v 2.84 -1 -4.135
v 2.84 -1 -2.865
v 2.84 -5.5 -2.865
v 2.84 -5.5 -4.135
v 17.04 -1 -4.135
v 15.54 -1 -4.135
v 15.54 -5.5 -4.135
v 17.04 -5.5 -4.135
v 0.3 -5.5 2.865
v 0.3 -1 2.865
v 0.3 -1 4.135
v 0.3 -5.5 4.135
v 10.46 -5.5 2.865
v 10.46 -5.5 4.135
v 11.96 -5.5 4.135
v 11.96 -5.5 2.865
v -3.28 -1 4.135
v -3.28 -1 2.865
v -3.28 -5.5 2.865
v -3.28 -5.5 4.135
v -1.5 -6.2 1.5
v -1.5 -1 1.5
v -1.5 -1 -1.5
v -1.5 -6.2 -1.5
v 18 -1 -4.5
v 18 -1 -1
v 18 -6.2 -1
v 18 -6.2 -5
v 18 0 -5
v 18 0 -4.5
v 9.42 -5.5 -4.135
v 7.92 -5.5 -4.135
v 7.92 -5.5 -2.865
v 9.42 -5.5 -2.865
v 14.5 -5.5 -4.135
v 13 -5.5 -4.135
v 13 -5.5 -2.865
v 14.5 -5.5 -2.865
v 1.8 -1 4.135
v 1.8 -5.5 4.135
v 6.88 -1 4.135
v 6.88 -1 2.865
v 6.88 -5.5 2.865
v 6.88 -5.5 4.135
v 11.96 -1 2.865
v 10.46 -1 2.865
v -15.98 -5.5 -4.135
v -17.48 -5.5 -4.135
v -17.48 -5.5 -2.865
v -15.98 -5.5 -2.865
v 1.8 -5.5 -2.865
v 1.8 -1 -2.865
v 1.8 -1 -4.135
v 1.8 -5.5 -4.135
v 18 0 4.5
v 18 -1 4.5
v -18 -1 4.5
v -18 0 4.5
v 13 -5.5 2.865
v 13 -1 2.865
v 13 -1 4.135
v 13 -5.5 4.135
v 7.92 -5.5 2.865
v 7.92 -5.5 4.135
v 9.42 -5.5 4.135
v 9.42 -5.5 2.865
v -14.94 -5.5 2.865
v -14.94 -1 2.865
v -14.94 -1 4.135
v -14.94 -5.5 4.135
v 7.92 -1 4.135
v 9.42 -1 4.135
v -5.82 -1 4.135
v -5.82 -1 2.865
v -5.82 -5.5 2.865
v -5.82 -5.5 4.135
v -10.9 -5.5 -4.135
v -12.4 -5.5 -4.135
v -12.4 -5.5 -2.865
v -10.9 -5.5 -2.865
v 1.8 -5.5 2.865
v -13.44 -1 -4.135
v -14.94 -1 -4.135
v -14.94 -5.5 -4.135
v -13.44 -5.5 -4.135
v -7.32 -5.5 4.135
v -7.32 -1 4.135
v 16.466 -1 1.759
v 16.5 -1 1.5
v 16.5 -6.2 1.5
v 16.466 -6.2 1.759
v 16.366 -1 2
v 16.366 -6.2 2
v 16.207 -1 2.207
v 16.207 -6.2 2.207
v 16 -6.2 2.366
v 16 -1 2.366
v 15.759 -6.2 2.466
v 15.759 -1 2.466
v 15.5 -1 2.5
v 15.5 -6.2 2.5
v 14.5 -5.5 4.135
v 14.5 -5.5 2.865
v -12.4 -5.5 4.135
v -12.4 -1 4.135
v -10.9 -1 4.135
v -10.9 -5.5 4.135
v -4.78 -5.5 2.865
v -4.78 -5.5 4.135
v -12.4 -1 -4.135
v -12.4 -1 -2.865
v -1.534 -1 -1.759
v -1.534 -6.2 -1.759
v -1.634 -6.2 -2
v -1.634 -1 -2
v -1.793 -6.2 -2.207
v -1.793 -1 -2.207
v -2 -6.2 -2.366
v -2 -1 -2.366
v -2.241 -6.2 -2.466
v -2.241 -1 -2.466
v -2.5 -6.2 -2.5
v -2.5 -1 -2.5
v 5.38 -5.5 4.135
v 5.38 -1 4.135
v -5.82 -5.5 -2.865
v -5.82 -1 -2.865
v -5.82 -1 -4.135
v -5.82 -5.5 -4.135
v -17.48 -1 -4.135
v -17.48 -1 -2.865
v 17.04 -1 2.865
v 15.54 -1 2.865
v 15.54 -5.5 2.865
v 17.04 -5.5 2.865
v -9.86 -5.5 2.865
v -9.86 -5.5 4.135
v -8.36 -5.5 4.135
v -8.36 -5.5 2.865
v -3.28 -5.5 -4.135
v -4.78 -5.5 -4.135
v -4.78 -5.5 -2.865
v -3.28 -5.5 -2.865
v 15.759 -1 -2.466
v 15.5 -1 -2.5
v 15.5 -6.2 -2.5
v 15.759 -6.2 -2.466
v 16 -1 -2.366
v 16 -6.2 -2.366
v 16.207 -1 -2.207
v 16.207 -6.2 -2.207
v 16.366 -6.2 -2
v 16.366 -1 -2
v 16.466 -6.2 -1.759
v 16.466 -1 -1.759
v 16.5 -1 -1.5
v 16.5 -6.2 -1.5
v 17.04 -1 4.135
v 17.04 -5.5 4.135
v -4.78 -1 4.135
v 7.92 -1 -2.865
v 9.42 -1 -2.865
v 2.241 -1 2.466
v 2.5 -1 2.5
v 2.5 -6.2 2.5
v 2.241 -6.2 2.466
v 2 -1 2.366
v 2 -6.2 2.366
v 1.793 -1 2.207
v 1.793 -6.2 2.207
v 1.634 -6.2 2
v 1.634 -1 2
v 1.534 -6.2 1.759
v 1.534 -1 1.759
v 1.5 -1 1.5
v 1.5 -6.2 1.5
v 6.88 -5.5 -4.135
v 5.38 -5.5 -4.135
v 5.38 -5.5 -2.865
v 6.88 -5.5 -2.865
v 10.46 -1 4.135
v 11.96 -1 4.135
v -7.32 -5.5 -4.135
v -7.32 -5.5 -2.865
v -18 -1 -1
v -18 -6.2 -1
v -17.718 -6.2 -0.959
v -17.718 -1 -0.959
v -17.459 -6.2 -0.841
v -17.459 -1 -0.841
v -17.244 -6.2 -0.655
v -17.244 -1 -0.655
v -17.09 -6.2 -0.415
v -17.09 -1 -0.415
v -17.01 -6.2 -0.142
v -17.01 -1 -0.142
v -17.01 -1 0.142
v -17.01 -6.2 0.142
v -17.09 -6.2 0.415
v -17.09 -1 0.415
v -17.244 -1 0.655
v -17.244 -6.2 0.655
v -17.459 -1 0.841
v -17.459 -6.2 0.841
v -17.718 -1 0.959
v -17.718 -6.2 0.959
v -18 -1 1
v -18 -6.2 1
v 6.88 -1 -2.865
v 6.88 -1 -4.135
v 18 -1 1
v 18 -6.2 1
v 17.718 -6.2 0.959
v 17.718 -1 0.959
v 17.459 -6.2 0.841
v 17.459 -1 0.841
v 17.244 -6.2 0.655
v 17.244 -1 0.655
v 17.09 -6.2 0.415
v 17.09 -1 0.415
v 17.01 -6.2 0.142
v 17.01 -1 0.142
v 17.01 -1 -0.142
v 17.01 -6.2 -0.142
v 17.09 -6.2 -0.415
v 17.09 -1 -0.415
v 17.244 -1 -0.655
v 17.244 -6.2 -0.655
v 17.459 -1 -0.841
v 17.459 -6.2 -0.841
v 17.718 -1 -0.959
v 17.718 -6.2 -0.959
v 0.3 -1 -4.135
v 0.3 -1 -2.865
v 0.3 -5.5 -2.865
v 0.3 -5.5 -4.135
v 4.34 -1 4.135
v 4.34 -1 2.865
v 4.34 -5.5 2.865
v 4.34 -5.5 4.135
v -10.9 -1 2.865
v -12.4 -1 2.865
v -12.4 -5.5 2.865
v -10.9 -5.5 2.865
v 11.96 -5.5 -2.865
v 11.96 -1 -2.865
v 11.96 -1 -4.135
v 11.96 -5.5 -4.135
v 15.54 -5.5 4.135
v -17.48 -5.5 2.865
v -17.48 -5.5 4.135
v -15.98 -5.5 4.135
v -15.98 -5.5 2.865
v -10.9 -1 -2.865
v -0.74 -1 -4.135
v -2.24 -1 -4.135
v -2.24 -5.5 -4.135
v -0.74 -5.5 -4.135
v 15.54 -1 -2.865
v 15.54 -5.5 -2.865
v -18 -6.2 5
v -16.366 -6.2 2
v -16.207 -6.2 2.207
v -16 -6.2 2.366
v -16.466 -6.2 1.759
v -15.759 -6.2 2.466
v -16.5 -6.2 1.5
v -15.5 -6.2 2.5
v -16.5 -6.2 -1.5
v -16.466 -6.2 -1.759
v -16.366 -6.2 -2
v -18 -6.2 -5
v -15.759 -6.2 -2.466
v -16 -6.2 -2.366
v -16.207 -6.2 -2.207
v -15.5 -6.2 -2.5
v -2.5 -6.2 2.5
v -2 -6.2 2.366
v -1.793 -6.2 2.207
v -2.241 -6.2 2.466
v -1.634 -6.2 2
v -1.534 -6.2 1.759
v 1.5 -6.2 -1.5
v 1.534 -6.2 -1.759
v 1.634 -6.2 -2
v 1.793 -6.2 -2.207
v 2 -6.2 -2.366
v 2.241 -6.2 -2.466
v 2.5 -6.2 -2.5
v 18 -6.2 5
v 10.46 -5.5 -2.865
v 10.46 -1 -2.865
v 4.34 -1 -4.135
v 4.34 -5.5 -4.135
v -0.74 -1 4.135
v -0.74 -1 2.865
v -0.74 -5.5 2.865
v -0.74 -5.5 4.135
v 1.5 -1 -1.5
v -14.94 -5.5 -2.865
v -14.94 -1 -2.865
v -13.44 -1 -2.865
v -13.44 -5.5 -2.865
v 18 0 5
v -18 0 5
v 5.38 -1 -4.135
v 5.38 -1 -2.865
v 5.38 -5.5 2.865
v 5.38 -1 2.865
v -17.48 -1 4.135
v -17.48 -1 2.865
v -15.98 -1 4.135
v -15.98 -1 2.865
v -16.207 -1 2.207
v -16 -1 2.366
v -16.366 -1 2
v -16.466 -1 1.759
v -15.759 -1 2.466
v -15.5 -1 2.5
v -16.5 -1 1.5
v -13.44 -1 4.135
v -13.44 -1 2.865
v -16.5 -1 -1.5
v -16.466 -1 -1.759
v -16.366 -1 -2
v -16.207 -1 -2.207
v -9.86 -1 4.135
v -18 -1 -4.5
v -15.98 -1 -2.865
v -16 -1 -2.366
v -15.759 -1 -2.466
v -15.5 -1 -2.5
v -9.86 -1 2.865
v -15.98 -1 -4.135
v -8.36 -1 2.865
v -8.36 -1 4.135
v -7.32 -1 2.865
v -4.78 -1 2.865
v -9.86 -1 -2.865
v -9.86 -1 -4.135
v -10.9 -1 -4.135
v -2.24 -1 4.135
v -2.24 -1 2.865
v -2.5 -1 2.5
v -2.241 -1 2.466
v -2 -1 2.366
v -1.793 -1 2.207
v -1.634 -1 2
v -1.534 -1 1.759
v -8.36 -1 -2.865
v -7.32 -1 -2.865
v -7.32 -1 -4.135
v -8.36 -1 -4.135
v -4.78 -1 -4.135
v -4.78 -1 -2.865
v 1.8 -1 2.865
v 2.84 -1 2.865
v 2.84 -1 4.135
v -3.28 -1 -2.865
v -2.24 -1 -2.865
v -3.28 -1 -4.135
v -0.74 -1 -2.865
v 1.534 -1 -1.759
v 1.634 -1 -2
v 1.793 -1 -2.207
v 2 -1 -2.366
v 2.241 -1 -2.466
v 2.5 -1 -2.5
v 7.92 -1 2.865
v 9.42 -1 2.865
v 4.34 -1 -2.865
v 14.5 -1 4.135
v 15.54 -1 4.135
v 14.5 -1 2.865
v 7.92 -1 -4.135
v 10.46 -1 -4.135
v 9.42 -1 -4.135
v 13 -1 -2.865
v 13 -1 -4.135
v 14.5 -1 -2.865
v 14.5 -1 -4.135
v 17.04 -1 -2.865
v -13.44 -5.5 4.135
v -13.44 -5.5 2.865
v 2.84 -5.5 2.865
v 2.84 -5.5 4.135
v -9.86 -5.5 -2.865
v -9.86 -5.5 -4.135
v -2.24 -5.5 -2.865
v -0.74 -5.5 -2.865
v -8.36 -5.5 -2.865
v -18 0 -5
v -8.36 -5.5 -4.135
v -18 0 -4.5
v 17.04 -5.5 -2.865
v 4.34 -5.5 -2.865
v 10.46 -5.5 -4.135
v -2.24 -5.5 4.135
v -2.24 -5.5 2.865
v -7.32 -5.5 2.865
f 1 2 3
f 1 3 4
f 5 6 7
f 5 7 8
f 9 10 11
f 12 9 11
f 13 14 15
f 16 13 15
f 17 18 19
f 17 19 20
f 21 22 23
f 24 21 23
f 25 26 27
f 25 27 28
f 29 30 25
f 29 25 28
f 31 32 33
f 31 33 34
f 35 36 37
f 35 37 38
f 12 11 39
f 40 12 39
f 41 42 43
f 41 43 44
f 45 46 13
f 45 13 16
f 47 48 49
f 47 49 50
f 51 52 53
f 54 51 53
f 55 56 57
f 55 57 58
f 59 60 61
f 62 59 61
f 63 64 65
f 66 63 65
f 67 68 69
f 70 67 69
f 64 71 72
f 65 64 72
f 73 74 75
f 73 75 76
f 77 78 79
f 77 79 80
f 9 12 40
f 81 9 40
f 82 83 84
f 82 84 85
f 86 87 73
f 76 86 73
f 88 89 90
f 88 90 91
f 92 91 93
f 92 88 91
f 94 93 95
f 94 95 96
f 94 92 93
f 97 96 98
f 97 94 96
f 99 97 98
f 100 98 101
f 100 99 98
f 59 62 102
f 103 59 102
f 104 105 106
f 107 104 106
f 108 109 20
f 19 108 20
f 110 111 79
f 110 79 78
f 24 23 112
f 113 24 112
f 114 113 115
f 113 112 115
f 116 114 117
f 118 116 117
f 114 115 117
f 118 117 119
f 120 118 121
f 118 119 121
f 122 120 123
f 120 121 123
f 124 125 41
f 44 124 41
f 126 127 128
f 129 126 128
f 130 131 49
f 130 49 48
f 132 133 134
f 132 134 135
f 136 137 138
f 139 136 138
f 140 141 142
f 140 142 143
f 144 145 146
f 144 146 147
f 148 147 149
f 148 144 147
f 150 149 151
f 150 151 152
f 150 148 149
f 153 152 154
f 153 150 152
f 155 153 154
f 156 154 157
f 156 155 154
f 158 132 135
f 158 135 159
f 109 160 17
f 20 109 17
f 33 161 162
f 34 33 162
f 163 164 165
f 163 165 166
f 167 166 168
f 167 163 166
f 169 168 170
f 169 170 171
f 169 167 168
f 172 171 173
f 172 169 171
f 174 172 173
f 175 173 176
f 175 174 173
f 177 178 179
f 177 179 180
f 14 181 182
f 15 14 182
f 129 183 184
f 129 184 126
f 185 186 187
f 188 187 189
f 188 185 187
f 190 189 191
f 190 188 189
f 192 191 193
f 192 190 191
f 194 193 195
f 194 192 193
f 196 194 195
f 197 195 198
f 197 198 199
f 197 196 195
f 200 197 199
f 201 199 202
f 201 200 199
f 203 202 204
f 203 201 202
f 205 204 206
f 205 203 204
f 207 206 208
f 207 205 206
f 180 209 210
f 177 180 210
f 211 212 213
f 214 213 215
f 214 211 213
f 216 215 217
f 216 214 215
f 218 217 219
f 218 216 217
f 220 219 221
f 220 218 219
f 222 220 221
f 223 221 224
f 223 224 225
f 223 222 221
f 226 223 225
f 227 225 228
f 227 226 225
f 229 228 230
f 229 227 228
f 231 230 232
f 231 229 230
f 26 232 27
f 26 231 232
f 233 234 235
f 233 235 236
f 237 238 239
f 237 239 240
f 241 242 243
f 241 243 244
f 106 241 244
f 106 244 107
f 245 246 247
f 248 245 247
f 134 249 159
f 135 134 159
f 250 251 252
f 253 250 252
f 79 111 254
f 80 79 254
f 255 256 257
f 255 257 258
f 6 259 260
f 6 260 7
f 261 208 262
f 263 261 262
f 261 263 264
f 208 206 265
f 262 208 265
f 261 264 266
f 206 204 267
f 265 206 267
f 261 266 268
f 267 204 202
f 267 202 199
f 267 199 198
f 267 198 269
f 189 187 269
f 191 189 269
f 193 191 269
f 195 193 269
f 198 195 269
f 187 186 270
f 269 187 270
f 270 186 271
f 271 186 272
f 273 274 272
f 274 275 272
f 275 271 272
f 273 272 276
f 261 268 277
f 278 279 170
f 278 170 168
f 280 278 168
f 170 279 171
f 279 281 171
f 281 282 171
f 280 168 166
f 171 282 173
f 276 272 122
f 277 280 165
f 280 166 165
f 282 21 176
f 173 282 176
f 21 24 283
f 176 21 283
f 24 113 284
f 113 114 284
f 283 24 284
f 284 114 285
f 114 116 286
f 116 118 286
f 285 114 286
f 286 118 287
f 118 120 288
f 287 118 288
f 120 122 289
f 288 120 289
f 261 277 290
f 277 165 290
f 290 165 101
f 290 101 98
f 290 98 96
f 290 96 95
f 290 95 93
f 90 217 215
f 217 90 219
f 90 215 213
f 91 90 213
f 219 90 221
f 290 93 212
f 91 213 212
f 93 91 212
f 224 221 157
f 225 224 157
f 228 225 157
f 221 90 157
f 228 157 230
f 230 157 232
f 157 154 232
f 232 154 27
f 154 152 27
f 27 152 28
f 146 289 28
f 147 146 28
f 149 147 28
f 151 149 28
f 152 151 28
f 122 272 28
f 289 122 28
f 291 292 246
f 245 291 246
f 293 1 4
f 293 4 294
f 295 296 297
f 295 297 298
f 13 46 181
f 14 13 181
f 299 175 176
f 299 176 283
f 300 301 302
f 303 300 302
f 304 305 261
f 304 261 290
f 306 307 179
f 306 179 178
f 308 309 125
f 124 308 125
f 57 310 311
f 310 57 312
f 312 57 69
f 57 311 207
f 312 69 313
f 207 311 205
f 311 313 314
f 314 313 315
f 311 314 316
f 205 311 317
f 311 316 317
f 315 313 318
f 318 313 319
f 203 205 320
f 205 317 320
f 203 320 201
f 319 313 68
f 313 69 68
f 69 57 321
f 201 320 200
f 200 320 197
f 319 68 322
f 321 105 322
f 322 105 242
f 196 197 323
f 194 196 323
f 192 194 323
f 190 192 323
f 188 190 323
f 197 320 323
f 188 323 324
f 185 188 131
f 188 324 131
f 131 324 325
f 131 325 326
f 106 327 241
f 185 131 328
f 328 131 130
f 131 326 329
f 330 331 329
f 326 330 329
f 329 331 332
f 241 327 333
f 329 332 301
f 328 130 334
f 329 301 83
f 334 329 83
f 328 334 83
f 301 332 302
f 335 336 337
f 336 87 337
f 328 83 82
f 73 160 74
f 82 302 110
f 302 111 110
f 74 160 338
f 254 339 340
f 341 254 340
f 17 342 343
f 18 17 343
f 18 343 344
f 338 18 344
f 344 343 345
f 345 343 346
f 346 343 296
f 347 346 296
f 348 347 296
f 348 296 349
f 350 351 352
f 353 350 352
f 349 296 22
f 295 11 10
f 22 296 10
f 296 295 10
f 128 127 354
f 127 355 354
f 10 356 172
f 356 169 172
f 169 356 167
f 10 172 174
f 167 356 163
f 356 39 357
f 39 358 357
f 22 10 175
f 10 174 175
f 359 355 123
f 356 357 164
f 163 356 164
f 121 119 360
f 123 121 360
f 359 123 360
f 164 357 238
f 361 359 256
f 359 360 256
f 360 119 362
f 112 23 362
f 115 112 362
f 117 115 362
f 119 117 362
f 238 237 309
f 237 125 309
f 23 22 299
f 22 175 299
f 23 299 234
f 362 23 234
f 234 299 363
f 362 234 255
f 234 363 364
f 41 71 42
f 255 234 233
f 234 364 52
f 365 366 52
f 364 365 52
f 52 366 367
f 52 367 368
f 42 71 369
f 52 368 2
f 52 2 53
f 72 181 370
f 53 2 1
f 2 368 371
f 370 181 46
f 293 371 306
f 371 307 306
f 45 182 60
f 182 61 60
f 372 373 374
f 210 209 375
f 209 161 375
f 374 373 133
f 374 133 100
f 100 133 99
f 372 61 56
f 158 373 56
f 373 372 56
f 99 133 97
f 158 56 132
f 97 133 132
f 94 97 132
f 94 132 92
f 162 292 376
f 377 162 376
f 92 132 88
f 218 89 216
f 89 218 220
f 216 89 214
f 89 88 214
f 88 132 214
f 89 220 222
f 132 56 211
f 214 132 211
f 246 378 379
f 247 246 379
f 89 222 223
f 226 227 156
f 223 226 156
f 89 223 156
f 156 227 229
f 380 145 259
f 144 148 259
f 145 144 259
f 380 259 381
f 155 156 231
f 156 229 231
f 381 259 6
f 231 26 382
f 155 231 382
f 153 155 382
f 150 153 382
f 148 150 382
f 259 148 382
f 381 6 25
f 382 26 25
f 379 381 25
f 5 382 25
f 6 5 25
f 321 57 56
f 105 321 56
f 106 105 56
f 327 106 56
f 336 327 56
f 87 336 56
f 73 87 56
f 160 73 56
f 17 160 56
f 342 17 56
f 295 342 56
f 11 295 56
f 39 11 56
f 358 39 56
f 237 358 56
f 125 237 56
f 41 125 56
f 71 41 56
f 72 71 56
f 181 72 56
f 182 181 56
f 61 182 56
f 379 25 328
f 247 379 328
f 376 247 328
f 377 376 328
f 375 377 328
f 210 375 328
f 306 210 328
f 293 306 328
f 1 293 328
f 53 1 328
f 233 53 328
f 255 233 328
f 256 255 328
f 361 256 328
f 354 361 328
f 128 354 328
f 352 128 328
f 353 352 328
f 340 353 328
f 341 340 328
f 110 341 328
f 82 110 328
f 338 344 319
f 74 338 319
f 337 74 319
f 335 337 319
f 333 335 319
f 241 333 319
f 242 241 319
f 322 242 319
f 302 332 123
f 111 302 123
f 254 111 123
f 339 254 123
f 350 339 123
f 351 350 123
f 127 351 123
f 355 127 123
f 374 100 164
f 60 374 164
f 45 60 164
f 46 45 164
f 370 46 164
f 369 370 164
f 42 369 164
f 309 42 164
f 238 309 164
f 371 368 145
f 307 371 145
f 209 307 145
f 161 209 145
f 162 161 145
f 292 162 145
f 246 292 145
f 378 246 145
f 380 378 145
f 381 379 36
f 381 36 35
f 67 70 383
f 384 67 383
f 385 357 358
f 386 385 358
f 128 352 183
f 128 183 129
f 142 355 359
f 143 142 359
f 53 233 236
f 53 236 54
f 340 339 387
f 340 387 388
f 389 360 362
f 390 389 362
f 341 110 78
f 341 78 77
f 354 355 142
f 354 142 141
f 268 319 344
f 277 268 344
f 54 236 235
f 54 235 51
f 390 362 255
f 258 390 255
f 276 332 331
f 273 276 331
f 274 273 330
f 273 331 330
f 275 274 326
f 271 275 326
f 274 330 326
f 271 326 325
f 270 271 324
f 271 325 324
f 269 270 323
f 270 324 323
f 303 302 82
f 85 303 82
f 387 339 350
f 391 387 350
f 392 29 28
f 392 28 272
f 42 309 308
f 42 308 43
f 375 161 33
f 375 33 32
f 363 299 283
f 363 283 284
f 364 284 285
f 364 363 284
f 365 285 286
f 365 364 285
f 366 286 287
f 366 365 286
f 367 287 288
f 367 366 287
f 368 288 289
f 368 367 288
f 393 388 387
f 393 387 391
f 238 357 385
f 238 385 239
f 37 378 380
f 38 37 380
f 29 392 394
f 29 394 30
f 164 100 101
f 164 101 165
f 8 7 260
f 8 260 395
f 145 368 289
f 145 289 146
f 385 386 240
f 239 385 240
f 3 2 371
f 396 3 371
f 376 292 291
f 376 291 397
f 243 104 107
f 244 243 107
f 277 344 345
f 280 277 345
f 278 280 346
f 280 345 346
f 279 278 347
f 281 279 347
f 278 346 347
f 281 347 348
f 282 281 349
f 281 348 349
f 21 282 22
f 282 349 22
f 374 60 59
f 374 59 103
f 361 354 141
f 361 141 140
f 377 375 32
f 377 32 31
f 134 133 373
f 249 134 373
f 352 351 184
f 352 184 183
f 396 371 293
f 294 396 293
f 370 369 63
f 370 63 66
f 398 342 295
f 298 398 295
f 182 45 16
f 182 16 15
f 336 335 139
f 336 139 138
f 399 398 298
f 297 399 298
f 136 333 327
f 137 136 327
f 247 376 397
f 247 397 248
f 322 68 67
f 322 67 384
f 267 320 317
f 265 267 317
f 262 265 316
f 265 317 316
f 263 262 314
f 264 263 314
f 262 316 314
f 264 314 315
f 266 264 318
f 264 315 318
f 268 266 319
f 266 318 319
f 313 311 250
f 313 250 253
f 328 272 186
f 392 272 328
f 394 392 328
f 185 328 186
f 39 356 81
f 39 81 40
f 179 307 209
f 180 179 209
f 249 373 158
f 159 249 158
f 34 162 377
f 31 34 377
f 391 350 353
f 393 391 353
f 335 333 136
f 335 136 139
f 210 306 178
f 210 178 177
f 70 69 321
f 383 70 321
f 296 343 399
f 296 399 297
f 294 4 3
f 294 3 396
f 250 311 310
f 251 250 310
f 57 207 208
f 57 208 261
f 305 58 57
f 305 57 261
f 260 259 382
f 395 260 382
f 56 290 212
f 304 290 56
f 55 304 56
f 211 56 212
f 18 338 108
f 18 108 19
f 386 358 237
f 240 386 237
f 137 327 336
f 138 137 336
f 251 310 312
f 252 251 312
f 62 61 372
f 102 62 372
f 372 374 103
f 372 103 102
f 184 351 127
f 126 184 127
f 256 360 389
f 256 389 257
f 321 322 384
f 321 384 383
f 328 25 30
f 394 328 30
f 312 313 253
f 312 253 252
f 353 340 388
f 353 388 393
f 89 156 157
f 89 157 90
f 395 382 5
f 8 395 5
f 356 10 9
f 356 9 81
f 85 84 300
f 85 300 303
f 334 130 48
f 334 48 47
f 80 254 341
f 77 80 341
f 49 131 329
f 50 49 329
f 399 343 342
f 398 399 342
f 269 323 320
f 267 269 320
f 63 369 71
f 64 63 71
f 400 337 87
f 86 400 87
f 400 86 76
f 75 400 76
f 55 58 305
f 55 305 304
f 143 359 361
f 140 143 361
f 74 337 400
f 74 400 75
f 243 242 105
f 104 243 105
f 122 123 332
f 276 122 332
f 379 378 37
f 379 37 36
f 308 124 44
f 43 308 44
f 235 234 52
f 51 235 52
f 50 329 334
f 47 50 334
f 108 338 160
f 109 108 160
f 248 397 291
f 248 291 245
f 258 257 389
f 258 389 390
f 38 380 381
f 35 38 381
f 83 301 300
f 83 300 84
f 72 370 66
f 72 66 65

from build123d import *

# Parameters (mm, degrees)
BOSS_EXTRU_1_DEPTH      = 6.2
ESQUISSE4_W             = 9
ESQUISSE4_H             = 1.618443578
ENL_V_MAT_EXTRU_1_DEPTH = 40.6
ESQUISSE5_W             = 1.5
ESQUISSE5_H             = 1.27
ENL_V_MAT_EXTRU_2_DEPTH = 4.5


with BuildPart() as part:
    # Esquisse2 → Boss.-Extru.1 (new body)
    with BuildSketch(Plane(origin=(0, 0, 0), x_dir=(1, 0, 0), z_dir=(0, 1, 0))):
        with BuildLine():
            Line((-18, -5), (18, -5))
            Line((18, -5), (18, -1))
            ThreePointArc((18, -1), (17, 0), (18, 1))
            Line((18, 1), (18, 5))
            Line((18, 5), (-18, 5))
            Line((-18, 5), (-18, 1))
            ThreePointArc((-18, 1), (-17, 0), (-18, -1))
            Line((-18, -1), (-18, -5))
        make_face()
        with BuildLine():
            Line((1.5, -1.5), (1.5, 1.5))
            ThreePointArc((1.5, 1.5), (1.792893219, 2.207106781), (2.5, 2.5))
            Line((2.5, 2.5), (15.5, 2.5))
            ThreePointArc((15.5, 2.5), (16.207106781, 2.207106781), (16.5, 1.5))
            Line((16.5, 1.5), (16.5, -1.5))
            ThreePointArc((16.5, -1.5), (16.207106781, -2.207106781), (15.5, -2.5))
            Line((15.5, -2.5), (2.5, -2.5))
            ThreePointArc((2.5, -2.5), (1.792893219, -2.207106781), (1.5, -1.5))
        make_face(mode=Mode.SUBTRACT)
        with BuildLine():
            Line((-15.5, -2.5), (-2.5, -2.5))
            ThreePointArc((-2.5, -2.5), (-1.792893219, -2.207106781), (-1.5, -1.5))
            Line((-1.5, -1.5), (-1.5, 1.5))
            ThreePointArc((-1.5, 1.5), (-1.792893219, 2.207106781), (-2.5, 2.5))
            Line((-2.5, 2.5), (-15.5, 2.5))
            ThreePointArc((-15.5, 2.5), (-16.207106781, 2.207106781), (-16.5, 1.5))
            Line((-16.5, 1.5), (-16.5, -1.5))
            ThreePointArc((-16.5, -1.5), (-16.207106781, -2.207106781), (-15.5, -2.5))
        make_face(mode=Mode.SUBTRACT)
    extrude(amount=-BOSS_EXTRU_1_DEPTH)

    # Esquisse4 → Enlèv. mat.-Extru.1 (cut)
    with BuildSketch(Plane(origin=(18, 0, 0), x_dir=(0, 0, -1), z_dir=(1, 0, 0))):
        with Locations((0, -0.190778211)):
            Rectangle(ESQUISSE4_W, ESQUISSE4_H)
    extrude(amount=-ENL_V_MAT_EXTRU_1_DEPTH, mode=Mode.SUBTRACT)

    # Esquisse5 → Enlèv. mat.-Extru.2 (cut)
    with BuildSketch(Plane(origin=(0, -1, 0), x_dir=(1, 0, 0), z_dir=(0, 1, 0))):
        with Locations((-16.73, 3.5)):
            Rectangle(ESQUISSE5_W, ESQUISSE5_H)
        with Locations((-14.19, 3.5)):
            Rectangle(ESQUISSE5_W, ESQUISSE5_H)
        with Locations((-11.65, 3.5)):
            Rectangle(ESQUISSE5_W, ESQUISSE5_H)
        with Locations((-9.11, 3.5)):
            Rectangle(ESQUISSE5_W, ESQUISSE5_H)
        with Locations((-6.57, 3.5)):
            Rectangle(ESQUISSE5_W, ESQUISSE5_H)
        with Locations((-4.03, 3.5)):
            Rectangle(ESQUISSE5_W, ESQUISSE5_H)
        with Locations((-1.49, 3.5)):
            Rectangle(ESQUISSE5_W, ESQUISSE5_H)
        with Locations((1.05, 3.5)):
            Rectangle(ESQUISSE5_W, ESQUISSE5_H)
        with Locations((3.59, 3.5)):
            Rectangle(ESQUISSE5_W, ESQUISSE5_H)
        with Locations((6.13, 3.5)):
            Rectangle(ESQUISSE5_W, ESQUISSE5_H)
        with Locations((8.67, 3.5)):
            Rectangle(ESQUISSE5_W, ESQUISSE5_H)
        with Locations((11.21, 3.5)):
            Rectangle(ESQUISSE5_W, ESQUISSE5_H)
        with Locations((13.75, 3.5)):
            Rectangle(ESQUISSE5_W, ESQUISSE5_H)
        with Locations((16.29, 3.5)):
            Rectangle(ESQUISSE5_W, ESQUISSE5_H)
    enl_v_mat_extru_2 = extrude(amount=-ENL_V_MAT_EXTRU_2_DEPTH, mode=Mode.SUBTRACT)

    # Symétrie1: Enlèv. mat.-Extru.2 across plane
    add(enl_v_mat_extru_2.mirror(Plane.XY), mode=Mode.SUBTRACT)


solid = part.part
